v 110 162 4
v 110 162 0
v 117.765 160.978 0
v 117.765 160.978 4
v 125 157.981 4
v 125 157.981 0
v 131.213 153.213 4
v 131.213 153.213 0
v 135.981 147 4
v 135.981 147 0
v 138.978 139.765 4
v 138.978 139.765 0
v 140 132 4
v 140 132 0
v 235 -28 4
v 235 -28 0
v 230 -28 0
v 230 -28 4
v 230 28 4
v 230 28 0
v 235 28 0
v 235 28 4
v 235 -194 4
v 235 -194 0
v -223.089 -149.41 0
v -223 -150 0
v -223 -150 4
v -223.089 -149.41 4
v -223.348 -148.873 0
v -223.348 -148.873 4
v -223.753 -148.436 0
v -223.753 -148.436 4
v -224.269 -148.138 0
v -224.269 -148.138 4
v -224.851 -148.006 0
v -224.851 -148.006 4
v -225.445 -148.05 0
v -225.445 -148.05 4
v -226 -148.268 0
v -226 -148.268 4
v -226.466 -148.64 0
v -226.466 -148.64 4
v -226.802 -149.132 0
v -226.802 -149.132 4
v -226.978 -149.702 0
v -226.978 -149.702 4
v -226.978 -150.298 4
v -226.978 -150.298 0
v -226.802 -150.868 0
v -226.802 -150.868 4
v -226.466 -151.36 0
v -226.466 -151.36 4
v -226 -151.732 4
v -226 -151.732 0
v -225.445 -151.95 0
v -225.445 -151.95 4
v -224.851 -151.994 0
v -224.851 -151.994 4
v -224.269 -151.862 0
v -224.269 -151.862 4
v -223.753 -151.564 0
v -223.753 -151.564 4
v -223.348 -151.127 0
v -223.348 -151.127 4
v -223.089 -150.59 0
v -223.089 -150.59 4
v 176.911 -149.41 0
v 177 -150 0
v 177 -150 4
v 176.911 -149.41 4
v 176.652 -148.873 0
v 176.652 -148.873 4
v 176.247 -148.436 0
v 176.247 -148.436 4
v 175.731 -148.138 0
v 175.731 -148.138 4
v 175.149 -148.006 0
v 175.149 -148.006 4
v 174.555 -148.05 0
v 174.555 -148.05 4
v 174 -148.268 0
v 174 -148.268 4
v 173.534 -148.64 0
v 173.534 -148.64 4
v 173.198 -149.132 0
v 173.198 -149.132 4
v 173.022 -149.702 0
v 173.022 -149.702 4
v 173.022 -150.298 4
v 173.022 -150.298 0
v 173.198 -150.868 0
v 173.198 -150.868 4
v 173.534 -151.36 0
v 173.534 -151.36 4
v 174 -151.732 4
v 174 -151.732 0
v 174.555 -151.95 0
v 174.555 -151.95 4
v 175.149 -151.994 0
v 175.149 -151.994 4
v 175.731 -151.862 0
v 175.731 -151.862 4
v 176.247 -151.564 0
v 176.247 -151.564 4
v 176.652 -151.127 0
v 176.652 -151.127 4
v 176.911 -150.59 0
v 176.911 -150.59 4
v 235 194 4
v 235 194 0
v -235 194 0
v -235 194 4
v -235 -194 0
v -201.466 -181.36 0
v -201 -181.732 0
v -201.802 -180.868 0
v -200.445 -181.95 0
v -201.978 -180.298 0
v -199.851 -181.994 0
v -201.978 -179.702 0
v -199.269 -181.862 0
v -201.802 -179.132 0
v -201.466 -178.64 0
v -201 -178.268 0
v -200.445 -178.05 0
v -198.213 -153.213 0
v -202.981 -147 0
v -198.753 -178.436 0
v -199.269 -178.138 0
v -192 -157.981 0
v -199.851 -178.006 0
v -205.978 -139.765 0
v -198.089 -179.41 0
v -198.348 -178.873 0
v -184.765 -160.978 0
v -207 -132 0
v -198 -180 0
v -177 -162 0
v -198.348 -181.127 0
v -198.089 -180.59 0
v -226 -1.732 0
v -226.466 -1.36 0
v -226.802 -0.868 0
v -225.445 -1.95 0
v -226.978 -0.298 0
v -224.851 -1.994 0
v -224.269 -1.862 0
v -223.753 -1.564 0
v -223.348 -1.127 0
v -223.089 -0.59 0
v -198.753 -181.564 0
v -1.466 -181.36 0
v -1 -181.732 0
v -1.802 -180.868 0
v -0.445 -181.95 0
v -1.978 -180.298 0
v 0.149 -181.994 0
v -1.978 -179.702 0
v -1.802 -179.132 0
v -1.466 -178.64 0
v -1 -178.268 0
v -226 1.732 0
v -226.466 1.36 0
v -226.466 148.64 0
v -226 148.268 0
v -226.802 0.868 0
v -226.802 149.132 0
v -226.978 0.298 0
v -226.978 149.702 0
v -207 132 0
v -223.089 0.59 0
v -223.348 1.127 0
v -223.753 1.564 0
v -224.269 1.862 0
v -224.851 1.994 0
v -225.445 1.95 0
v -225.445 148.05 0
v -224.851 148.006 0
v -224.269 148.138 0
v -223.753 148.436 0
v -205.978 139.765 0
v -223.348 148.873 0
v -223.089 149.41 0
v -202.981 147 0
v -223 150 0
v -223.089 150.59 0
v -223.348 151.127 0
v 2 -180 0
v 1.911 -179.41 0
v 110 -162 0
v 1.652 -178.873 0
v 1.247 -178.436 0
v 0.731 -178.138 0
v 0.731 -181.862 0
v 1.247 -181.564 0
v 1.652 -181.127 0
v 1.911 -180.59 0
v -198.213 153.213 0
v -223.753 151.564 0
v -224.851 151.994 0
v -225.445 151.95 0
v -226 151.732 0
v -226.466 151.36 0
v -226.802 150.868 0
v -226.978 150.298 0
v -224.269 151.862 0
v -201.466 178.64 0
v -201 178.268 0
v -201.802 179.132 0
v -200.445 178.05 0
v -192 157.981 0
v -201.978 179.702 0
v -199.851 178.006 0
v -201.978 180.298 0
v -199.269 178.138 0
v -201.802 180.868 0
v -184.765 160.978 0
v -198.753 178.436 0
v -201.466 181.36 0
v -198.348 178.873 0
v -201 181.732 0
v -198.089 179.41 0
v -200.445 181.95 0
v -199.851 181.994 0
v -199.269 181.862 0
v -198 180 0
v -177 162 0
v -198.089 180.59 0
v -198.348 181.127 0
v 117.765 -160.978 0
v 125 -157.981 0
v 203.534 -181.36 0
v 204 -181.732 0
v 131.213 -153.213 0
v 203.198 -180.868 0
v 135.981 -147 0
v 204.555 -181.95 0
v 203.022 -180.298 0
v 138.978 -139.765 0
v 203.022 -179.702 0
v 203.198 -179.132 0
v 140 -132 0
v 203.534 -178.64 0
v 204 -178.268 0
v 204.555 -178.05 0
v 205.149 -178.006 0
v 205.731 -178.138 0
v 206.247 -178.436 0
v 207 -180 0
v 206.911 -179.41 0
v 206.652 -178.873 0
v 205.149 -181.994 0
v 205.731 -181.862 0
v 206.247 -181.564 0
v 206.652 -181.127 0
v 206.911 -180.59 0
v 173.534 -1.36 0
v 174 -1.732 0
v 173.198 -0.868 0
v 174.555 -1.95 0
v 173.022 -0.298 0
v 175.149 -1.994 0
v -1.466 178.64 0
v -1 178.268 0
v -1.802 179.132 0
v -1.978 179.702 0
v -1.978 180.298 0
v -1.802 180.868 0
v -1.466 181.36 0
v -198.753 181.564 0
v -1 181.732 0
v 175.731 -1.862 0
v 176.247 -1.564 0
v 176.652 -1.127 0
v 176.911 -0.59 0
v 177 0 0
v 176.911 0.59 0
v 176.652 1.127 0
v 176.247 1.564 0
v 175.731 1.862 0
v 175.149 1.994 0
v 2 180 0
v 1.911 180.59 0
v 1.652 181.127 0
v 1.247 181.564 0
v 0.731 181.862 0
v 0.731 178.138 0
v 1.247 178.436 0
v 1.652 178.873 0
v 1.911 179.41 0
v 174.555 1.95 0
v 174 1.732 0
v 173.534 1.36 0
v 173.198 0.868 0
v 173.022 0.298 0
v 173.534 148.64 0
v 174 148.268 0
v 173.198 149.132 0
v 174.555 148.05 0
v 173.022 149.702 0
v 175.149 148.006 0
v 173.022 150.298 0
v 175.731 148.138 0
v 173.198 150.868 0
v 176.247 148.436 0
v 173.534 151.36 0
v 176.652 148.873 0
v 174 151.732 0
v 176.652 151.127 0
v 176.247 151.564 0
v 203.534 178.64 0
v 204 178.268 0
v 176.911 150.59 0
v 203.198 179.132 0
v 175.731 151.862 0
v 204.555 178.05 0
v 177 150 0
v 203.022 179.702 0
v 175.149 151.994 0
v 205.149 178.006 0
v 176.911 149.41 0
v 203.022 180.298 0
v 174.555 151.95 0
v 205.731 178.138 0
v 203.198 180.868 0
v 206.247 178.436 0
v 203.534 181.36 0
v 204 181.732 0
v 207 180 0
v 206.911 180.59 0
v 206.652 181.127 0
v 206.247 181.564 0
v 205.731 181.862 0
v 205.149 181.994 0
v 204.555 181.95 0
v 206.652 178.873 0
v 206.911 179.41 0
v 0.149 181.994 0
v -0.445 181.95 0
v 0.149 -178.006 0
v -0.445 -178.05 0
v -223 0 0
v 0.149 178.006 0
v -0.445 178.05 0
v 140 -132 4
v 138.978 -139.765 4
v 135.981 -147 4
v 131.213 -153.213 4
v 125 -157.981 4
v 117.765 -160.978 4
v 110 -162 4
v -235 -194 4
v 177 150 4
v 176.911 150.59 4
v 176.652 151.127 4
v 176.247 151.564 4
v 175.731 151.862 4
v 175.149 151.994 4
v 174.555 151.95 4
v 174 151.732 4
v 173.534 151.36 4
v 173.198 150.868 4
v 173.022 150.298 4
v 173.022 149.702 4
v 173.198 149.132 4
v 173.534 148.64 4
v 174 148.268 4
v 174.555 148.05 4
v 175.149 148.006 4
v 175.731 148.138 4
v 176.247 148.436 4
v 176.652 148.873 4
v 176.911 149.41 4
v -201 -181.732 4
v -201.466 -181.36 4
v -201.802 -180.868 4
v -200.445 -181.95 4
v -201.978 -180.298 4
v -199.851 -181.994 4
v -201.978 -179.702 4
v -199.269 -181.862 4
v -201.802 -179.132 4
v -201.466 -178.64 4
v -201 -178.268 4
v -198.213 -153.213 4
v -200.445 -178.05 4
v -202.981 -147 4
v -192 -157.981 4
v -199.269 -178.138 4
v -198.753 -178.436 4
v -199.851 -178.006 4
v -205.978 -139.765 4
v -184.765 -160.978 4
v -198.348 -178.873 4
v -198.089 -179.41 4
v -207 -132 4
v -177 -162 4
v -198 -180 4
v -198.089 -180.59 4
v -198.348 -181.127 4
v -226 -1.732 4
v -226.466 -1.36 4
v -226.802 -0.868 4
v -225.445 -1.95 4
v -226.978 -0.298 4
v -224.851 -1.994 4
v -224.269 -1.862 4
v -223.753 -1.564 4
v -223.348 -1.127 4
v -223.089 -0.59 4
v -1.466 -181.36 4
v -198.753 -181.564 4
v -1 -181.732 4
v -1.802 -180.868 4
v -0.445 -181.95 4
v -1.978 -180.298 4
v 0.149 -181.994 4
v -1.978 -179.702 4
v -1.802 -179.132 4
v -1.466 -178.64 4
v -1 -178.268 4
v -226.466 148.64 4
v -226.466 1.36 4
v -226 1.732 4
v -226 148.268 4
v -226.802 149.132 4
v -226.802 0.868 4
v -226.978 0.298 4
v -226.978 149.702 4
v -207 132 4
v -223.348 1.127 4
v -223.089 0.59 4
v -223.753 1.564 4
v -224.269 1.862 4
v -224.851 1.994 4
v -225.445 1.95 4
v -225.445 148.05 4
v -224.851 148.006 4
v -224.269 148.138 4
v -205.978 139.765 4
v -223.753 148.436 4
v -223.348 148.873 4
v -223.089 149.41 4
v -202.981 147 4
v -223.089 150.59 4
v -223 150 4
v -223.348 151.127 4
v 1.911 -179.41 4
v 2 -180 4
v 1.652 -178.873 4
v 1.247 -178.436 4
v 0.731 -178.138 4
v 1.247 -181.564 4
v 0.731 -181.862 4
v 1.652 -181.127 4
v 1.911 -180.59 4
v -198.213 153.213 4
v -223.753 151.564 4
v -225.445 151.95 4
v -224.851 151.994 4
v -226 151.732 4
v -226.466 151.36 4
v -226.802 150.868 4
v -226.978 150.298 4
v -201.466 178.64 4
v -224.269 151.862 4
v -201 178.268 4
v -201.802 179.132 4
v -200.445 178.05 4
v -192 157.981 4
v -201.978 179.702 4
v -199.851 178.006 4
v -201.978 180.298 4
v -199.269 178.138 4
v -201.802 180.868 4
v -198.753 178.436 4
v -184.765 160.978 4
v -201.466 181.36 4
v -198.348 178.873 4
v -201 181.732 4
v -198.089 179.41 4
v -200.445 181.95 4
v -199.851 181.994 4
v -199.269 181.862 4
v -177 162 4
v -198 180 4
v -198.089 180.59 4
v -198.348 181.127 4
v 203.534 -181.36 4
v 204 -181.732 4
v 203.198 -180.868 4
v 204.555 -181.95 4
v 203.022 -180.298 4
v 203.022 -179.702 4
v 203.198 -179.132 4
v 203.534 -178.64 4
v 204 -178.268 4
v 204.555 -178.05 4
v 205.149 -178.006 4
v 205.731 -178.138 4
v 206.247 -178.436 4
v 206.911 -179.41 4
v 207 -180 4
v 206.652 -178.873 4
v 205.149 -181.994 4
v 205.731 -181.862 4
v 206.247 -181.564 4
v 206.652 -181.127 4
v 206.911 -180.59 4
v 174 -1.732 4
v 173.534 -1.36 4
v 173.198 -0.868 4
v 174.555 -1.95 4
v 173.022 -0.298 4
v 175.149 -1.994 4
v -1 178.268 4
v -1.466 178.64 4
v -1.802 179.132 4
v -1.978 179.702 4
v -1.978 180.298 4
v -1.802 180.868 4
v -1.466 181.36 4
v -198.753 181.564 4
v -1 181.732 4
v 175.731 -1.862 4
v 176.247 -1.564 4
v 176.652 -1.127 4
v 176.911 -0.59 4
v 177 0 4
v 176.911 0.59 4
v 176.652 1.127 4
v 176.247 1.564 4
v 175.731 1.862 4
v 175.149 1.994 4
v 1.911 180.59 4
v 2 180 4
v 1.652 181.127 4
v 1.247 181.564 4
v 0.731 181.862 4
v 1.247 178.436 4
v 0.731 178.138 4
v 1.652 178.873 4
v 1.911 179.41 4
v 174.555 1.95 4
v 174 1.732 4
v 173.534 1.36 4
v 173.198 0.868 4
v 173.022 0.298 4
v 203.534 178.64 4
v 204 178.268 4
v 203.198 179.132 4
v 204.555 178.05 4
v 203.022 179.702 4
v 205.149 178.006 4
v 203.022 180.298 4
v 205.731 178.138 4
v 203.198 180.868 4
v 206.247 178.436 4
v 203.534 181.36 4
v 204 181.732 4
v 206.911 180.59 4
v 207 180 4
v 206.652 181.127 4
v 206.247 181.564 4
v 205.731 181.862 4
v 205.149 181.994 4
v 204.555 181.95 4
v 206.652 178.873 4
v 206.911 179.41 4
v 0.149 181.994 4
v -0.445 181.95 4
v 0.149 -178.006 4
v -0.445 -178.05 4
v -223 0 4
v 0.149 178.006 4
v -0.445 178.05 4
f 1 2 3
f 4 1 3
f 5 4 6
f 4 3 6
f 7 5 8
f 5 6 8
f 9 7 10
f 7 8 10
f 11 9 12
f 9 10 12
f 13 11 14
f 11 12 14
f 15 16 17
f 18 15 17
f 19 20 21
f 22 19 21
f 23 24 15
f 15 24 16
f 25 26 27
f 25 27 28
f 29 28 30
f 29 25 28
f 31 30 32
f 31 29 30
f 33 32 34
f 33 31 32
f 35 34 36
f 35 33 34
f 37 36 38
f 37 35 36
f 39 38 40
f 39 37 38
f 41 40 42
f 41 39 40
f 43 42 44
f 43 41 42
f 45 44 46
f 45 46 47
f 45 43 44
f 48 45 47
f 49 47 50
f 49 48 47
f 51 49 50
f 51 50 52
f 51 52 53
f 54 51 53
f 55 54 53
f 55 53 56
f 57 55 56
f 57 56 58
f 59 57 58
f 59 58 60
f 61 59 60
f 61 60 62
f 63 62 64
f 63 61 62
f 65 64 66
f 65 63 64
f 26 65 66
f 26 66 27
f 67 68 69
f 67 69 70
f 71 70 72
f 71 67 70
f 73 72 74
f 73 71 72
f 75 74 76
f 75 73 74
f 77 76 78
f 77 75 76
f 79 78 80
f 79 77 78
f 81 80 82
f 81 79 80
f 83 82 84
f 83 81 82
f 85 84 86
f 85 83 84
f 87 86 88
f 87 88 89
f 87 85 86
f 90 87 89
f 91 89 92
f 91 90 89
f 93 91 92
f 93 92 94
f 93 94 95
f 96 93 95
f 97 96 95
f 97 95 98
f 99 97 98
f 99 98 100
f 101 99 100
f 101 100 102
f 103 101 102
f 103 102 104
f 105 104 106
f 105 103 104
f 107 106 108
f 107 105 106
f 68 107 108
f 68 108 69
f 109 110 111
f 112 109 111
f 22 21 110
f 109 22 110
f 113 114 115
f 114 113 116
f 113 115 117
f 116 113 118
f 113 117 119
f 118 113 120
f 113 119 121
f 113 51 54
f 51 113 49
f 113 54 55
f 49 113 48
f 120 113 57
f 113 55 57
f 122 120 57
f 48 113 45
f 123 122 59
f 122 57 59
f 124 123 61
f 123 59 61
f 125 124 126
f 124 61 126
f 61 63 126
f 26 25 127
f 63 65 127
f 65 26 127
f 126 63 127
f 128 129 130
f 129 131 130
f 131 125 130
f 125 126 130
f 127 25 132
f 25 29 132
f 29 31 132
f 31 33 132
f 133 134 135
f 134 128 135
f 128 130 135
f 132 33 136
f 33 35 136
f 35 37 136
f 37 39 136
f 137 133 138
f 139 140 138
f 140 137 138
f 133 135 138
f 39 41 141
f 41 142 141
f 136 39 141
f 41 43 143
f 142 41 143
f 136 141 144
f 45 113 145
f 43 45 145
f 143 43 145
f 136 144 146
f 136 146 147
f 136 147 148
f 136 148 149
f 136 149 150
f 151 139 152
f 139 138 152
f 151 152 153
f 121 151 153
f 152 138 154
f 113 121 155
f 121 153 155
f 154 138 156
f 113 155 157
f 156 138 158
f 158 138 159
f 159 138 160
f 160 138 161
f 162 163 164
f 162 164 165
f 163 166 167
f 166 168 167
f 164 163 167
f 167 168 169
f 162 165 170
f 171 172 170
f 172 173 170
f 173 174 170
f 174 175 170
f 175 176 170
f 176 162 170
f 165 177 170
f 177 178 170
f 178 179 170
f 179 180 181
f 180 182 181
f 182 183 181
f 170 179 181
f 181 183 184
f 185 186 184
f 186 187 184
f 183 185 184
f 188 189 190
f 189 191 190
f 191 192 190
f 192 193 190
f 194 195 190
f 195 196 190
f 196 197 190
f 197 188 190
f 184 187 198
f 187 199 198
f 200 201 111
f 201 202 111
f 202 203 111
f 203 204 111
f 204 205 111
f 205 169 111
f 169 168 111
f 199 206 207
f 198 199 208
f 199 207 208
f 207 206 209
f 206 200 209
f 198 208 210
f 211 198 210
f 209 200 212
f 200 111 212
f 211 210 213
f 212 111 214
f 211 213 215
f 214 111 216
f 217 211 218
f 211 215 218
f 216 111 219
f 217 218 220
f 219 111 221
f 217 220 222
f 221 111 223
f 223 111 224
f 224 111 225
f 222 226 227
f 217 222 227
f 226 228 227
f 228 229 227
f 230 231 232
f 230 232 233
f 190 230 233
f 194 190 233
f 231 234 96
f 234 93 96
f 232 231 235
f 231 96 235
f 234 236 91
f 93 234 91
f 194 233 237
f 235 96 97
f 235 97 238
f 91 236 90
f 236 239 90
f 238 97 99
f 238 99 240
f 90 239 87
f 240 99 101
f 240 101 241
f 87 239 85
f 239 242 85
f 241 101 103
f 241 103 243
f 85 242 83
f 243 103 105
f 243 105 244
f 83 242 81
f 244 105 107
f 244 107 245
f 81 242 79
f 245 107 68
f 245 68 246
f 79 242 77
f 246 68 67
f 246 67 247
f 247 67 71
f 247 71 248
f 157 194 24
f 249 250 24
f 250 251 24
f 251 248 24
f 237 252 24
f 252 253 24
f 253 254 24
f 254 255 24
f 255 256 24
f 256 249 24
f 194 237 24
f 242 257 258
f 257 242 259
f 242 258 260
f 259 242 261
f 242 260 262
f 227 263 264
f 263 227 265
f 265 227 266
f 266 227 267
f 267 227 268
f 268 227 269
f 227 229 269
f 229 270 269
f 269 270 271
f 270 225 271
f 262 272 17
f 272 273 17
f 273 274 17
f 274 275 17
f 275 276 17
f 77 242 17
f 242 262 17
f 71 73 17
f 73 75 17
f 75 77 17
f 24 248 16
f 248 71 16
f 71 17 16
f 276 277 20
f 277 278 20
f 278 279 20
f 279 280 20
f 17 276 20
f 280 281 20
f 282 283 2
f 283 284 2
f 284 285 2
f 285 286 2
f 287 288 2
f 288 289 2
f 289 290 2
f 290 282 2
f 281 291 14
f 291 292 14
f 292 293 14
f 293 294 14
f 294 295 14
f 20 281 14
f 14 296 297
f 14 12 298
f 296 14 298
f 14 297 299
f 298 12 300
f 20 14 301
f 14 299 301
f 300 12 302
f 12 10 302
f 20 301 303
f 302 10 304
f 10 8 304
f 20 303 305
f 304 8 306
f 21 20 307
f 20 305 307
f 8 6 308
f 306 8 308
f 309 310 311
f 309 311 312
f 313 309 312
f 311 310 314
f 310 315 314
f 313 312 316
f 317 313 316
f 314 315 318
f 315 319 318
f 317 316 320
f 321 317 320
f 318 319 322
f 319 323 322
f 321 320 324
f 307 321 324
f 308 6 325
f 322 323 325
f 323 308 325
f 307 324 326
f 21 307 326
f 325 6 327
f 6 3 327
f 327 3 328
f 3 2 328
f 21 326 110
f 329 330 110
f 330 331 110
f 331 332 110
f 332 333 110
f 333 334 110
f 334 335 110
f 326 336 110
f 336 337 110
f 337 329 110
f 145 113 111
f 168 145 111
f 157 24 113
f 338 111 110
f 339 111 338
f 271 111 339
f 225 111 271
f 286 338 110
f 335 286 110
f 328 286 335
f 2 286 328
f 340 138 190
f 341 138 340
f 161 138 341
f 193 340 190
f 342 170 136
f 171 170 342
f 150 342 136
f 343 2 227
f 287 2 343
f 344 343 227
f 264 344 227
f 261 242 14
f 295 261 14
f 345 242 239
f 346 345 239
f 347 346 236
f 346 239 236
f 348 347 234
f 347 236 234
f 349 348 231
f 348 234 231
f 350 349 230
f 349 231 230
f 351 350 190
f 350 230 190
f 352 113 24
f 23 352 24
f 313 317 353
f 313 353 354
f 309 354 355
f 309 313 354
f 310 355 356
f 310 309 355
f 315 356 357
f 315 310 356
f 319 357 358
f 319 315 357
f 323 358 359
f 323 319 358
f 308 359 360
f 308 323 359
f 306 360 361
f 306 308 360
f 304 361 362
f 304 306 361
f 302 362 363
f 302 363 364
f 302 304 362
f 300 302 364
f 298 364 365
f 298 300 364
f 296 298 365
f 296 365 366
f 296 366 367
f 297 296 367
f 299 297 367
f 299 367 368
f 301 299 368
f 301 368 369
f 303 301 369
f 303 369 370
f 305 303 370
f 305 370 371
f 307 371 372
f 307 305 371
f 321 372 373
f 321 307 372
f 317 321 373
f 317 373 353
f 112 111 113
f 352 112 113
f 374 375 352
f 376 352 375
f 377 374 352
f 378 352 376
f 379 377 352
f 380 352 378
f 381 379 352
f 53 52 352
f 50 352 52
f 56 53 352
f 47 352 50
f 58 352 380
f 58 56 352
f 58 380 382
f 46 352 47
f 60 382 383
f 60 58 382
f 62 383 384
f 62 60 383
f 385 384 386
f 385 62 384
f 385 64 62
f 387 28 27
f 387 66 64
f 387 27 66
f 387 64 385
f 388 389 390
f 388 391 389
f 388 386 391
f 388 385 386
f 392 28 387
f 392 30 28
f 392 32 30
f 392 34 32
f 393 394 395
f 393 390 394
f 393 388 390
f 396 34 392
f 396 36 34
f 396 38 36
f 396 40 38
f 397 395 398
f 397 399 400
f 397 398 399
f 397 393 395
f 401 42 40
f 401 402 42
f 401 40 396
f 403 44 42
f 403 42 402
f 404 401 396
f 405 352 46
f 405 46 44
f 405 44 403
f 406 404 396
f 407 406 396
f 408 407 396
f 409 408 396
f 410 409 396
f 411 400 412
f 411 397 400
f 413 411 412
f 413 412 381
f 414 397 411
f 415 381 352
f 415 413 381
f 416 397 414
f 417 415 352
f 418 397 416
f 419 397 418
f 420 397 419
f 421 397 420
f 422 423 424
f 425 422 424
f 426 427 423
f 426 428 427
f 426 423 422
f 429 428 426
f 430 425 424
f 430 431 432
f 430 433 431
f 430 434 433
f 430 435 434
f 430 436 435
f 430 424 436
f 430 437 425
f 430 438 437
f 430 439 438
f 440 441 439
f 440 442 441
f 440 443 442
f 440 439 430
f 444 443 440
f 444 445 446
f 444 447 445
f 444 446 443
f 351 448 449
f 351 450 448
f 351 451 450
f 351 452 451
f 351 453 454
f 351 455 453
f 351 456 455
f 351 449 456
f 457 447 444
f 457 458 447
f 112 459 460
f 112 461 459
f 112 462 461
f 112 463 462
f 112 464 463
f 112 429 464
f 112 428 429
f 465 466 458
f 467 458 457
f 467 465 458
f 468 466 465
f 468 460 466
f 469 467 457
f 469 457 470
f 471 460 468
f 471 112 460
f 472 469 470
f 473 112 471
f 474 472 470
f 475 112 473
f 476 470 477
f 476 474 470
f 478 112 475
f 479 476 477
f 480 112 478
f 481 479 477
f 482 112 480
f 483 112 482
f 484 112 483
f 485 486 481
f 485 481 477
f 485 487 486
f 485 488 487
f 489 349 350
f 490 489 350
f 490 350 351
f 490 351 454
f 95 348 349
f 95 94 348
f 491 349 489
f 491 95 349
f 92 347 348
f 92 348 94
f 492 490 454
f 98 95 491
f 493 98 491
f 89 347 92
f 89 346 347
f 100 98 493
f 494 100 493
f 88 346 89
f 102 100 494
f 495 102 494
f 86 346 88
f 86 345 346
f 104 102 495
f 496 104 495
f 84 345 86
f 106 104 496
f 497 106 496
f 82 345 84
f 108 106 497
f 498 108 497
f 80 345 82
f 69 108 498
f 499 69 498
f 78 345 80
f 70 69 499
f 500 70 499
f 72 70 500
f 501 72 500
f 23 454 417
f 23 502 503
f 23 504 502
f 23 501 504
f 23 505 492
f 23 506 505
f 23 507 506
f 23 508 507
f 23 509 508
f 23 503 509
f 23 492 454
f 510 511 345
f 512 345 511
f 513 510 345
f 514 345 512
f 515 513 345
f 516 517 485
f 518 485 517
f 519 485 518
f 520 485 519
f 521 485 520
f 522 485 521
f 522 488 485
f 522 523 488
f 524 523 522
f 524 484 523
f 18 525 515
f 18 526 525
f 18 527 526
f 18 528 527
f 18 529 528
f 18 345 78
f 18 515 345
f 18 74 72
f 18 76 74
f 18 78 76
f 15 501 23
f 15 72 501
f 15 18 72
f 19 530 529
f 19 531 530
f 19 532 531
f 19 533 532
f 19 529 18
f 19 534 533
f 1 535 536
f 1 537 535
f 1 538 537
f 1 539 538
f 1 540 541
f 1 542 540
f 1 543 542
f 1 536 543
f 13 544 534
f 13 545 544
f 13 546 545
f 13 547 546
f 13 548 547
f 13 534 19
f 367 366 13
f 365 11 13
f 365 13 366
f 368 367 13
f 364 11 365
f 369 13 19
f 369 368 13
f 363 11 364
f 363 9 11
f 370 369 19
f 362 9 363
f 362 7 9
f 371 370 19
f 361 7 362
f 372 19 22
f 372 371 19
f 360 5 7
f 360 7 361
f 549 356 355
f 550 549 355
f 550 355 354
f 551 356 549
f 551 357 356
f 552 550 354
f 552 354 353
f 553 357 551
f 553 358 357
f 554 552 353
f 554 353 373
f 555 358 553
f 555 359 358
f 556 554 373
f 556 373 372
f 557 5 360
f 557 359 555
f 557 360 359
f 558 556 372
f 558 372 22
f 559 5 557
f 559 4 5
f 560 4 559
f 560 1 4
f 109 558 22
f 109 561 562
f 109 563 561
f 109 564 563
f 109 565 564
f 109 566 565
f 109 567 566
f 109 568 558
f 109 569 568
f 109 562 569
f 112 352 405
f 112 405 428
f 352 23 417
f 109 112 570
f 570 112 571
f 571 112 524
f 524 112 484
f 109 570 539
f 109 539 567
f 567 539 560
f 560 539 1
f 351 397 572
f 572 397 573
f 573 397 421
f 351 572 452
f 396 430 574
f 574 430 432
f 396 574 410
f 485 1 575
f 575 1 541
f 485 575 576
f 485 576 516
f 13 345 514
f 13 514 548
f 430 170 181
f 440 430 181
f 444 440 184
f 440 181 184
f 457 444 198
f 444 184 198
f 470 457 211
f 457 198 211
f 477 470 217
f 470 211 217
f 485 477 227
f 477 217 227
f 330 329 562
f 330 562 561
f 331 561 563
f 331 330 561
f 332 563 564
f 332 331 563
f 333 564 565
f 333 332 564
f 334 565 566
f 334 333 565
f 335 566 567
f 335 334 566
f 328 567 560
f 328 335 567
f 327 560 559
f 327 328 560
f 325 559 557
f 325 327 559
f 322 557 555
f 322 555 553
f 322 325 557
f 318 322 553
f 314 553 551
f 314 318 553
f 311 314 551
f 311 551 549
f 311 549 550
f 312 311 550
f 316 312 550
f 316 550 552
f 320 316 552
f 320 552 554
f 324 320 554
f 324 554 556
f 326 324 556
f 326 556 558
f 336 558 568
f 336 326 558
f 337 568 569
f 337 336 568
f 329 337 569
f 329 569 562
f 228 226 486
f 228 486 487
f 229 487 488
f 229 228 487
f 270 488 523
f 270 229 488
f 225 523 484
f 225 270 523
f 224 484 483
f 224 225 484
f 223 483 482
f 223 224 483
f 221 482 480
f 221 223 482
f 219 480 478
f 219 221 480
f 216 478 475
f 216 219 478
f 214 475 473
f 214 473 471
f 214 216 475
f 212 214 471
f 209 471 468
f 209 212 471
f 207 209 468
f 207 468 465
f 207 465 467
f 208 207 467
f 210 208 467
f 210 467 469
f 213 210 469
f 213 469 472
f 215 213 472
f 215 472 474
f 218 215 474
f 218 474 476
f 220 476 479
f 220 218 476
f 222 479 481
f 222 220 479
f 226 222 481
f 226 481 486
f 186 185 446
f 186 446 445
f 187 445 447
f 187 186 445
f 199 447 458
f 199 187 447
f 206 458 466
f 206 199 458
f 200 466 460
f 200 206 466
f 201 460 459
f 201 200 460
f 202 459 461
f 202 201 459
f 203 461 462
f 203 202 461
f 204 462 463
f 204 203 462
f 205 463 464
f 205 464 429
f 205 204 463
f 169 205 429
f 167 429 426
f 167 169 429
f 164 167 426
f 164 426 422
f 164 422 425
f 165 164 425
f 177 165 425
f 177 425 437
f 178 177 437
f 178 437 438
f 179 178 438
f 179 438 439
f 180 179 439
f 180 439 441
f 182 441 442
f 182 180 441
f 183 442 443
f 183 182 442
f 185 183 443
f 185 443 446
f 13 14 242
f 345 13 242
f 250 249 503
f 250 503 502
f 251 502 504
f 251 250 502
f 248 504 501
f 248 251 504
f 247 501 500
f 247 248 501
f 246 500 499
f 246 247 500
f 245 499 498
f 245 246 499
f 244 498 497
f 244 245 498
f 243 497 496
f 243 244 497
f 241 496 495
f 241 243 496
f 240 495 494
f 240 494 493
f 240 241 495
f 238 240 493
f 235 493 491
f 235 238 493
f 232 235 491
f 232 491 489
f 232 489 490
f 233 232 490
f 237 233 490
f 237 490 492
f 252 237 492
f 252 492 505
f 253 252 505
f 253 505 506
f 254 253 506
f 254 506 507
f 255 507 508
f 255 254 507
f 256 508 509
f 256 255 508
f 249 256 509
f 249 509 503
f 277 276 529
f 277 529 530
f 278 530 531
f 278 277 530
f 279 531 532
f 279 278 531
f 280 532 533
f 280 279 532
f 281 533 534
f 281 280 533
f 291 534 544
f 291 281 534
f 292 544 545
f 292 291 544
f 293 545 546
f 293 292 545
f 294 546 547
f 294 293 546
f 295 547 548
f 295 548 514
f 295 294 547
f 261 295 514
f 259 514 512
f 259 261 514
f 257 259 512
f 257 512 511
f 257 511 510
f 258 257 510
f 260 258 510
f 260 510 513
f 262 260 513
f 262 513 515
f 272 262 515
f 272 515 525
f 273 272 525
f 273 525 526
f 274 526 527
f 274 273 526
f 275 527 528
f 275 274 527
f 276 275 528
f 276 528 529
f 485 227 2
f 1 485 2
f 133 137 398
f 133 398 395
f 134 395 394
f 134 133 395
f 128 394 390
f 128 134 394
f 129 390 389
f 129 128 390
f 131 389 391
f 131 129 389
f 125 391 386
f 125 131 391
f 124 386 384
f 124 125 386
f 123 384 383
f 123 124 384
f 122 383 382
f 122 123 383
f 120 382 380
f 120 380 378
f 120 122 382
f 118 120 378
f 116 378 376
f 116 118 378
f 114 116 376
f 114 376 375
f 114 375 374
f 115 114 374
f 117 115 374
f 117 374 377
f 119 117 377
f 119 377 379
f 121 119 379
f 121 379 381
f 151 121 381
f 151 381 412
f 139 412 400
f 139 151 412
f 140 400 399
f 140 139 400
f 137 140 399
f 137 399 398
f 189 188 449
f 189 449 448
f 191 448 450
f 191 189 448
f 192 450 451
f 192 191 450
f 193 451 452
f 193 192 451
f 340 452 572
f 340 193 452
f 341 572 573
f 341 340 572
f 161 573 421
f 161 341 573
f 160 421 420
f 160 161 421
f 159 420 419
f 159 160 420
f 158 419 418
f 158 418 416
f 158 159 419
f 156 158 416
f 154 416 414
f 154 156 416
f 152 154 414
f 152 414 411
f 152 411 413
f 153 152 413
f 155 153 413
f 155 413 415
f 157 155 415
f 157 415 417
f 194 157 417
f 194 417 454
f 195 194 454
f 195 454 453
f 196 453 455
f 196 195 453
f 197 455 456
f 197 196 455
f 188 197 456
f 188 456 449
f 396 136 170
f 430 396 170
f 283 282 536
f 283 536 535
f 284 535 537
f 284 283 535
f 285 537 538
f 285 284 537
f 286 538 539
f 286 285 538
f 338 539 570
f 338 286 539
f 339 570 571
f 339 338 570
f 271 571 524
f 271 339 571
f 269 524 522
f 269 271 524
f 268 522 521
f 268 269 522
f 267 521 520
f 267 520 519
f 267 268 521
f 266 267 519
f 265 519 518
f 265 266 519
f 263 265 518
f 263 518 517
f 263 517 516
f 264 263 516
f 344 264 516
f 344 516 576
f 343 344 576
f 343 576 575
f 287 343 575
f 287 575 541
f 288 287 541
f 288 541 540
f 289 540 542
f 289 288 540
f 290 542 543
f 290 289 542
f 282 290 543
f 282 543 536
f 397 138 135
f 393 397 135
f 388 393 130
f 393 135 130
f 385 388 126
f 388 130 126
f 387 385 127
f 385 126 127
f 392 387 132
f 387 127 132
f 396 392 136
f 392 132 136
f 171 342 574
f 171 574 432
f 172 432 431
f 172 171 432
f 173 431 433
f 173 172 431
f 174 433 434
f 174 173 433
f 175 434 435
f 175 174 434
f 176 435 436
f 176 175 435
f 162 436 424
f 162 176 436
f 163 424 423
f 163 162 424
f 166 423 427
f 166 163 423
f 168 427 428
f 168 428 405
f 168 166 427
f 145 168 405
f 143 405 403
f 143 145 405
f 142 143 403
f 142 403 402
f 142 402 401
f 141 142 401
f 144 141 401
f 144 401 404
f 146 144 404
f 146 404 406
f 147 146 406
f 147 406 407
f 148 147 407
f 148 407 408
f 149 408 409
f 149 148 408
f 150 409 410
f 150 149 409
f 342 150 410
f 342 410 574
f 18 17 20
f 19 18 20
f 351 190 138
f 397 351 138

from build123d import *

# Parameters (mm, degrees)
F0_R     = 2
F1_DEPTH = 4


# Not quite as in the source:
# - a feature names something its author has since deleted; it is built from what else it names


with BuildPart() as f1:
    # F0 (on Top) → F1 (new body)
    with BuildSketch(Plane.XY):
        Polygon((-235, 194), (-235, 190), (-235, -170), (-235, -190), (-235, -194), (235, -194), (235, -190), (235, -28), (230, -28), (230, 0), (230, 28), (235, 28), (235, 190), (235, 194), align=None)
        with Locations((-200, -180)):
            Circle(F0_R, mode=Mode.SUBTRACT)
        with Locations((-225, -150)):
            Circle(F0_R, mode=Mode.SUBTRACT)
        with Locations((-225, 0)):
            Circle(F0_R, mode=Mode.SUBTRACT)
        with BuildLine():
            Line((110, -161.9999999998), (-177, -162))
            ThreePointArc((-177, -162), (-198.2132034356, -153.2132034356), (-207, -132))
            Line((-207, -132), (-207, 0))
            Line((-207, 0), (-207, 132))
            ThreePointArc((-207, 132), (-198.2132034356, 153.2132034356), (-177, 162))
            Line((-177, 162), (110, 161.9999999998))
            ThreePointArc((110, 161.9999999998), (131.2132034356, 153.2132034354), (140, 131.9999999998))
            Line((140, 131.9999999998), (140, 0))
            Line((140, 0), (140, -131.9999999998))
            ThreePointArc((140, -131.9999999998), (131.2132034356, -153.2132034354), (110, -161.9999999998))
        make_face(mode=Mode.SUBTRACT)
        with Locations((0, -180)):
            Circle(F0_R, mode=Mode.SUBTRACT)
        with Locations((175, -150)):
            Circle(F0_R, mode=Mode.SUBTRACT)
        with Locations((205, -180)):
            Circle(F0_R, mode=Mode.SUBTRACT)
        with Locations((175, 0)):
            Circle(F0_R, mode=Mode.SUBTRACT)
        with Locations((-225, 150)):
            Circle(F0_R, mode=Mode.SUBTRACT)
        with Locations((-200, 180)):
            Circle(F0_R, mode=Mode.SUBTRACT)
        with Locations((0, 180)):
            Circle(F0_R, mode=Mode.SUBTRACT)
        with Locations((175, 150)):
            Circle(F0_R, mode=Mode.SUBTRACT)
        with Locations((205, 180)):
            Circle(F0_R, mode=Mode.SUBTRACT)
    extrude(amount=F1_DEPTH)


solid = f1.part
